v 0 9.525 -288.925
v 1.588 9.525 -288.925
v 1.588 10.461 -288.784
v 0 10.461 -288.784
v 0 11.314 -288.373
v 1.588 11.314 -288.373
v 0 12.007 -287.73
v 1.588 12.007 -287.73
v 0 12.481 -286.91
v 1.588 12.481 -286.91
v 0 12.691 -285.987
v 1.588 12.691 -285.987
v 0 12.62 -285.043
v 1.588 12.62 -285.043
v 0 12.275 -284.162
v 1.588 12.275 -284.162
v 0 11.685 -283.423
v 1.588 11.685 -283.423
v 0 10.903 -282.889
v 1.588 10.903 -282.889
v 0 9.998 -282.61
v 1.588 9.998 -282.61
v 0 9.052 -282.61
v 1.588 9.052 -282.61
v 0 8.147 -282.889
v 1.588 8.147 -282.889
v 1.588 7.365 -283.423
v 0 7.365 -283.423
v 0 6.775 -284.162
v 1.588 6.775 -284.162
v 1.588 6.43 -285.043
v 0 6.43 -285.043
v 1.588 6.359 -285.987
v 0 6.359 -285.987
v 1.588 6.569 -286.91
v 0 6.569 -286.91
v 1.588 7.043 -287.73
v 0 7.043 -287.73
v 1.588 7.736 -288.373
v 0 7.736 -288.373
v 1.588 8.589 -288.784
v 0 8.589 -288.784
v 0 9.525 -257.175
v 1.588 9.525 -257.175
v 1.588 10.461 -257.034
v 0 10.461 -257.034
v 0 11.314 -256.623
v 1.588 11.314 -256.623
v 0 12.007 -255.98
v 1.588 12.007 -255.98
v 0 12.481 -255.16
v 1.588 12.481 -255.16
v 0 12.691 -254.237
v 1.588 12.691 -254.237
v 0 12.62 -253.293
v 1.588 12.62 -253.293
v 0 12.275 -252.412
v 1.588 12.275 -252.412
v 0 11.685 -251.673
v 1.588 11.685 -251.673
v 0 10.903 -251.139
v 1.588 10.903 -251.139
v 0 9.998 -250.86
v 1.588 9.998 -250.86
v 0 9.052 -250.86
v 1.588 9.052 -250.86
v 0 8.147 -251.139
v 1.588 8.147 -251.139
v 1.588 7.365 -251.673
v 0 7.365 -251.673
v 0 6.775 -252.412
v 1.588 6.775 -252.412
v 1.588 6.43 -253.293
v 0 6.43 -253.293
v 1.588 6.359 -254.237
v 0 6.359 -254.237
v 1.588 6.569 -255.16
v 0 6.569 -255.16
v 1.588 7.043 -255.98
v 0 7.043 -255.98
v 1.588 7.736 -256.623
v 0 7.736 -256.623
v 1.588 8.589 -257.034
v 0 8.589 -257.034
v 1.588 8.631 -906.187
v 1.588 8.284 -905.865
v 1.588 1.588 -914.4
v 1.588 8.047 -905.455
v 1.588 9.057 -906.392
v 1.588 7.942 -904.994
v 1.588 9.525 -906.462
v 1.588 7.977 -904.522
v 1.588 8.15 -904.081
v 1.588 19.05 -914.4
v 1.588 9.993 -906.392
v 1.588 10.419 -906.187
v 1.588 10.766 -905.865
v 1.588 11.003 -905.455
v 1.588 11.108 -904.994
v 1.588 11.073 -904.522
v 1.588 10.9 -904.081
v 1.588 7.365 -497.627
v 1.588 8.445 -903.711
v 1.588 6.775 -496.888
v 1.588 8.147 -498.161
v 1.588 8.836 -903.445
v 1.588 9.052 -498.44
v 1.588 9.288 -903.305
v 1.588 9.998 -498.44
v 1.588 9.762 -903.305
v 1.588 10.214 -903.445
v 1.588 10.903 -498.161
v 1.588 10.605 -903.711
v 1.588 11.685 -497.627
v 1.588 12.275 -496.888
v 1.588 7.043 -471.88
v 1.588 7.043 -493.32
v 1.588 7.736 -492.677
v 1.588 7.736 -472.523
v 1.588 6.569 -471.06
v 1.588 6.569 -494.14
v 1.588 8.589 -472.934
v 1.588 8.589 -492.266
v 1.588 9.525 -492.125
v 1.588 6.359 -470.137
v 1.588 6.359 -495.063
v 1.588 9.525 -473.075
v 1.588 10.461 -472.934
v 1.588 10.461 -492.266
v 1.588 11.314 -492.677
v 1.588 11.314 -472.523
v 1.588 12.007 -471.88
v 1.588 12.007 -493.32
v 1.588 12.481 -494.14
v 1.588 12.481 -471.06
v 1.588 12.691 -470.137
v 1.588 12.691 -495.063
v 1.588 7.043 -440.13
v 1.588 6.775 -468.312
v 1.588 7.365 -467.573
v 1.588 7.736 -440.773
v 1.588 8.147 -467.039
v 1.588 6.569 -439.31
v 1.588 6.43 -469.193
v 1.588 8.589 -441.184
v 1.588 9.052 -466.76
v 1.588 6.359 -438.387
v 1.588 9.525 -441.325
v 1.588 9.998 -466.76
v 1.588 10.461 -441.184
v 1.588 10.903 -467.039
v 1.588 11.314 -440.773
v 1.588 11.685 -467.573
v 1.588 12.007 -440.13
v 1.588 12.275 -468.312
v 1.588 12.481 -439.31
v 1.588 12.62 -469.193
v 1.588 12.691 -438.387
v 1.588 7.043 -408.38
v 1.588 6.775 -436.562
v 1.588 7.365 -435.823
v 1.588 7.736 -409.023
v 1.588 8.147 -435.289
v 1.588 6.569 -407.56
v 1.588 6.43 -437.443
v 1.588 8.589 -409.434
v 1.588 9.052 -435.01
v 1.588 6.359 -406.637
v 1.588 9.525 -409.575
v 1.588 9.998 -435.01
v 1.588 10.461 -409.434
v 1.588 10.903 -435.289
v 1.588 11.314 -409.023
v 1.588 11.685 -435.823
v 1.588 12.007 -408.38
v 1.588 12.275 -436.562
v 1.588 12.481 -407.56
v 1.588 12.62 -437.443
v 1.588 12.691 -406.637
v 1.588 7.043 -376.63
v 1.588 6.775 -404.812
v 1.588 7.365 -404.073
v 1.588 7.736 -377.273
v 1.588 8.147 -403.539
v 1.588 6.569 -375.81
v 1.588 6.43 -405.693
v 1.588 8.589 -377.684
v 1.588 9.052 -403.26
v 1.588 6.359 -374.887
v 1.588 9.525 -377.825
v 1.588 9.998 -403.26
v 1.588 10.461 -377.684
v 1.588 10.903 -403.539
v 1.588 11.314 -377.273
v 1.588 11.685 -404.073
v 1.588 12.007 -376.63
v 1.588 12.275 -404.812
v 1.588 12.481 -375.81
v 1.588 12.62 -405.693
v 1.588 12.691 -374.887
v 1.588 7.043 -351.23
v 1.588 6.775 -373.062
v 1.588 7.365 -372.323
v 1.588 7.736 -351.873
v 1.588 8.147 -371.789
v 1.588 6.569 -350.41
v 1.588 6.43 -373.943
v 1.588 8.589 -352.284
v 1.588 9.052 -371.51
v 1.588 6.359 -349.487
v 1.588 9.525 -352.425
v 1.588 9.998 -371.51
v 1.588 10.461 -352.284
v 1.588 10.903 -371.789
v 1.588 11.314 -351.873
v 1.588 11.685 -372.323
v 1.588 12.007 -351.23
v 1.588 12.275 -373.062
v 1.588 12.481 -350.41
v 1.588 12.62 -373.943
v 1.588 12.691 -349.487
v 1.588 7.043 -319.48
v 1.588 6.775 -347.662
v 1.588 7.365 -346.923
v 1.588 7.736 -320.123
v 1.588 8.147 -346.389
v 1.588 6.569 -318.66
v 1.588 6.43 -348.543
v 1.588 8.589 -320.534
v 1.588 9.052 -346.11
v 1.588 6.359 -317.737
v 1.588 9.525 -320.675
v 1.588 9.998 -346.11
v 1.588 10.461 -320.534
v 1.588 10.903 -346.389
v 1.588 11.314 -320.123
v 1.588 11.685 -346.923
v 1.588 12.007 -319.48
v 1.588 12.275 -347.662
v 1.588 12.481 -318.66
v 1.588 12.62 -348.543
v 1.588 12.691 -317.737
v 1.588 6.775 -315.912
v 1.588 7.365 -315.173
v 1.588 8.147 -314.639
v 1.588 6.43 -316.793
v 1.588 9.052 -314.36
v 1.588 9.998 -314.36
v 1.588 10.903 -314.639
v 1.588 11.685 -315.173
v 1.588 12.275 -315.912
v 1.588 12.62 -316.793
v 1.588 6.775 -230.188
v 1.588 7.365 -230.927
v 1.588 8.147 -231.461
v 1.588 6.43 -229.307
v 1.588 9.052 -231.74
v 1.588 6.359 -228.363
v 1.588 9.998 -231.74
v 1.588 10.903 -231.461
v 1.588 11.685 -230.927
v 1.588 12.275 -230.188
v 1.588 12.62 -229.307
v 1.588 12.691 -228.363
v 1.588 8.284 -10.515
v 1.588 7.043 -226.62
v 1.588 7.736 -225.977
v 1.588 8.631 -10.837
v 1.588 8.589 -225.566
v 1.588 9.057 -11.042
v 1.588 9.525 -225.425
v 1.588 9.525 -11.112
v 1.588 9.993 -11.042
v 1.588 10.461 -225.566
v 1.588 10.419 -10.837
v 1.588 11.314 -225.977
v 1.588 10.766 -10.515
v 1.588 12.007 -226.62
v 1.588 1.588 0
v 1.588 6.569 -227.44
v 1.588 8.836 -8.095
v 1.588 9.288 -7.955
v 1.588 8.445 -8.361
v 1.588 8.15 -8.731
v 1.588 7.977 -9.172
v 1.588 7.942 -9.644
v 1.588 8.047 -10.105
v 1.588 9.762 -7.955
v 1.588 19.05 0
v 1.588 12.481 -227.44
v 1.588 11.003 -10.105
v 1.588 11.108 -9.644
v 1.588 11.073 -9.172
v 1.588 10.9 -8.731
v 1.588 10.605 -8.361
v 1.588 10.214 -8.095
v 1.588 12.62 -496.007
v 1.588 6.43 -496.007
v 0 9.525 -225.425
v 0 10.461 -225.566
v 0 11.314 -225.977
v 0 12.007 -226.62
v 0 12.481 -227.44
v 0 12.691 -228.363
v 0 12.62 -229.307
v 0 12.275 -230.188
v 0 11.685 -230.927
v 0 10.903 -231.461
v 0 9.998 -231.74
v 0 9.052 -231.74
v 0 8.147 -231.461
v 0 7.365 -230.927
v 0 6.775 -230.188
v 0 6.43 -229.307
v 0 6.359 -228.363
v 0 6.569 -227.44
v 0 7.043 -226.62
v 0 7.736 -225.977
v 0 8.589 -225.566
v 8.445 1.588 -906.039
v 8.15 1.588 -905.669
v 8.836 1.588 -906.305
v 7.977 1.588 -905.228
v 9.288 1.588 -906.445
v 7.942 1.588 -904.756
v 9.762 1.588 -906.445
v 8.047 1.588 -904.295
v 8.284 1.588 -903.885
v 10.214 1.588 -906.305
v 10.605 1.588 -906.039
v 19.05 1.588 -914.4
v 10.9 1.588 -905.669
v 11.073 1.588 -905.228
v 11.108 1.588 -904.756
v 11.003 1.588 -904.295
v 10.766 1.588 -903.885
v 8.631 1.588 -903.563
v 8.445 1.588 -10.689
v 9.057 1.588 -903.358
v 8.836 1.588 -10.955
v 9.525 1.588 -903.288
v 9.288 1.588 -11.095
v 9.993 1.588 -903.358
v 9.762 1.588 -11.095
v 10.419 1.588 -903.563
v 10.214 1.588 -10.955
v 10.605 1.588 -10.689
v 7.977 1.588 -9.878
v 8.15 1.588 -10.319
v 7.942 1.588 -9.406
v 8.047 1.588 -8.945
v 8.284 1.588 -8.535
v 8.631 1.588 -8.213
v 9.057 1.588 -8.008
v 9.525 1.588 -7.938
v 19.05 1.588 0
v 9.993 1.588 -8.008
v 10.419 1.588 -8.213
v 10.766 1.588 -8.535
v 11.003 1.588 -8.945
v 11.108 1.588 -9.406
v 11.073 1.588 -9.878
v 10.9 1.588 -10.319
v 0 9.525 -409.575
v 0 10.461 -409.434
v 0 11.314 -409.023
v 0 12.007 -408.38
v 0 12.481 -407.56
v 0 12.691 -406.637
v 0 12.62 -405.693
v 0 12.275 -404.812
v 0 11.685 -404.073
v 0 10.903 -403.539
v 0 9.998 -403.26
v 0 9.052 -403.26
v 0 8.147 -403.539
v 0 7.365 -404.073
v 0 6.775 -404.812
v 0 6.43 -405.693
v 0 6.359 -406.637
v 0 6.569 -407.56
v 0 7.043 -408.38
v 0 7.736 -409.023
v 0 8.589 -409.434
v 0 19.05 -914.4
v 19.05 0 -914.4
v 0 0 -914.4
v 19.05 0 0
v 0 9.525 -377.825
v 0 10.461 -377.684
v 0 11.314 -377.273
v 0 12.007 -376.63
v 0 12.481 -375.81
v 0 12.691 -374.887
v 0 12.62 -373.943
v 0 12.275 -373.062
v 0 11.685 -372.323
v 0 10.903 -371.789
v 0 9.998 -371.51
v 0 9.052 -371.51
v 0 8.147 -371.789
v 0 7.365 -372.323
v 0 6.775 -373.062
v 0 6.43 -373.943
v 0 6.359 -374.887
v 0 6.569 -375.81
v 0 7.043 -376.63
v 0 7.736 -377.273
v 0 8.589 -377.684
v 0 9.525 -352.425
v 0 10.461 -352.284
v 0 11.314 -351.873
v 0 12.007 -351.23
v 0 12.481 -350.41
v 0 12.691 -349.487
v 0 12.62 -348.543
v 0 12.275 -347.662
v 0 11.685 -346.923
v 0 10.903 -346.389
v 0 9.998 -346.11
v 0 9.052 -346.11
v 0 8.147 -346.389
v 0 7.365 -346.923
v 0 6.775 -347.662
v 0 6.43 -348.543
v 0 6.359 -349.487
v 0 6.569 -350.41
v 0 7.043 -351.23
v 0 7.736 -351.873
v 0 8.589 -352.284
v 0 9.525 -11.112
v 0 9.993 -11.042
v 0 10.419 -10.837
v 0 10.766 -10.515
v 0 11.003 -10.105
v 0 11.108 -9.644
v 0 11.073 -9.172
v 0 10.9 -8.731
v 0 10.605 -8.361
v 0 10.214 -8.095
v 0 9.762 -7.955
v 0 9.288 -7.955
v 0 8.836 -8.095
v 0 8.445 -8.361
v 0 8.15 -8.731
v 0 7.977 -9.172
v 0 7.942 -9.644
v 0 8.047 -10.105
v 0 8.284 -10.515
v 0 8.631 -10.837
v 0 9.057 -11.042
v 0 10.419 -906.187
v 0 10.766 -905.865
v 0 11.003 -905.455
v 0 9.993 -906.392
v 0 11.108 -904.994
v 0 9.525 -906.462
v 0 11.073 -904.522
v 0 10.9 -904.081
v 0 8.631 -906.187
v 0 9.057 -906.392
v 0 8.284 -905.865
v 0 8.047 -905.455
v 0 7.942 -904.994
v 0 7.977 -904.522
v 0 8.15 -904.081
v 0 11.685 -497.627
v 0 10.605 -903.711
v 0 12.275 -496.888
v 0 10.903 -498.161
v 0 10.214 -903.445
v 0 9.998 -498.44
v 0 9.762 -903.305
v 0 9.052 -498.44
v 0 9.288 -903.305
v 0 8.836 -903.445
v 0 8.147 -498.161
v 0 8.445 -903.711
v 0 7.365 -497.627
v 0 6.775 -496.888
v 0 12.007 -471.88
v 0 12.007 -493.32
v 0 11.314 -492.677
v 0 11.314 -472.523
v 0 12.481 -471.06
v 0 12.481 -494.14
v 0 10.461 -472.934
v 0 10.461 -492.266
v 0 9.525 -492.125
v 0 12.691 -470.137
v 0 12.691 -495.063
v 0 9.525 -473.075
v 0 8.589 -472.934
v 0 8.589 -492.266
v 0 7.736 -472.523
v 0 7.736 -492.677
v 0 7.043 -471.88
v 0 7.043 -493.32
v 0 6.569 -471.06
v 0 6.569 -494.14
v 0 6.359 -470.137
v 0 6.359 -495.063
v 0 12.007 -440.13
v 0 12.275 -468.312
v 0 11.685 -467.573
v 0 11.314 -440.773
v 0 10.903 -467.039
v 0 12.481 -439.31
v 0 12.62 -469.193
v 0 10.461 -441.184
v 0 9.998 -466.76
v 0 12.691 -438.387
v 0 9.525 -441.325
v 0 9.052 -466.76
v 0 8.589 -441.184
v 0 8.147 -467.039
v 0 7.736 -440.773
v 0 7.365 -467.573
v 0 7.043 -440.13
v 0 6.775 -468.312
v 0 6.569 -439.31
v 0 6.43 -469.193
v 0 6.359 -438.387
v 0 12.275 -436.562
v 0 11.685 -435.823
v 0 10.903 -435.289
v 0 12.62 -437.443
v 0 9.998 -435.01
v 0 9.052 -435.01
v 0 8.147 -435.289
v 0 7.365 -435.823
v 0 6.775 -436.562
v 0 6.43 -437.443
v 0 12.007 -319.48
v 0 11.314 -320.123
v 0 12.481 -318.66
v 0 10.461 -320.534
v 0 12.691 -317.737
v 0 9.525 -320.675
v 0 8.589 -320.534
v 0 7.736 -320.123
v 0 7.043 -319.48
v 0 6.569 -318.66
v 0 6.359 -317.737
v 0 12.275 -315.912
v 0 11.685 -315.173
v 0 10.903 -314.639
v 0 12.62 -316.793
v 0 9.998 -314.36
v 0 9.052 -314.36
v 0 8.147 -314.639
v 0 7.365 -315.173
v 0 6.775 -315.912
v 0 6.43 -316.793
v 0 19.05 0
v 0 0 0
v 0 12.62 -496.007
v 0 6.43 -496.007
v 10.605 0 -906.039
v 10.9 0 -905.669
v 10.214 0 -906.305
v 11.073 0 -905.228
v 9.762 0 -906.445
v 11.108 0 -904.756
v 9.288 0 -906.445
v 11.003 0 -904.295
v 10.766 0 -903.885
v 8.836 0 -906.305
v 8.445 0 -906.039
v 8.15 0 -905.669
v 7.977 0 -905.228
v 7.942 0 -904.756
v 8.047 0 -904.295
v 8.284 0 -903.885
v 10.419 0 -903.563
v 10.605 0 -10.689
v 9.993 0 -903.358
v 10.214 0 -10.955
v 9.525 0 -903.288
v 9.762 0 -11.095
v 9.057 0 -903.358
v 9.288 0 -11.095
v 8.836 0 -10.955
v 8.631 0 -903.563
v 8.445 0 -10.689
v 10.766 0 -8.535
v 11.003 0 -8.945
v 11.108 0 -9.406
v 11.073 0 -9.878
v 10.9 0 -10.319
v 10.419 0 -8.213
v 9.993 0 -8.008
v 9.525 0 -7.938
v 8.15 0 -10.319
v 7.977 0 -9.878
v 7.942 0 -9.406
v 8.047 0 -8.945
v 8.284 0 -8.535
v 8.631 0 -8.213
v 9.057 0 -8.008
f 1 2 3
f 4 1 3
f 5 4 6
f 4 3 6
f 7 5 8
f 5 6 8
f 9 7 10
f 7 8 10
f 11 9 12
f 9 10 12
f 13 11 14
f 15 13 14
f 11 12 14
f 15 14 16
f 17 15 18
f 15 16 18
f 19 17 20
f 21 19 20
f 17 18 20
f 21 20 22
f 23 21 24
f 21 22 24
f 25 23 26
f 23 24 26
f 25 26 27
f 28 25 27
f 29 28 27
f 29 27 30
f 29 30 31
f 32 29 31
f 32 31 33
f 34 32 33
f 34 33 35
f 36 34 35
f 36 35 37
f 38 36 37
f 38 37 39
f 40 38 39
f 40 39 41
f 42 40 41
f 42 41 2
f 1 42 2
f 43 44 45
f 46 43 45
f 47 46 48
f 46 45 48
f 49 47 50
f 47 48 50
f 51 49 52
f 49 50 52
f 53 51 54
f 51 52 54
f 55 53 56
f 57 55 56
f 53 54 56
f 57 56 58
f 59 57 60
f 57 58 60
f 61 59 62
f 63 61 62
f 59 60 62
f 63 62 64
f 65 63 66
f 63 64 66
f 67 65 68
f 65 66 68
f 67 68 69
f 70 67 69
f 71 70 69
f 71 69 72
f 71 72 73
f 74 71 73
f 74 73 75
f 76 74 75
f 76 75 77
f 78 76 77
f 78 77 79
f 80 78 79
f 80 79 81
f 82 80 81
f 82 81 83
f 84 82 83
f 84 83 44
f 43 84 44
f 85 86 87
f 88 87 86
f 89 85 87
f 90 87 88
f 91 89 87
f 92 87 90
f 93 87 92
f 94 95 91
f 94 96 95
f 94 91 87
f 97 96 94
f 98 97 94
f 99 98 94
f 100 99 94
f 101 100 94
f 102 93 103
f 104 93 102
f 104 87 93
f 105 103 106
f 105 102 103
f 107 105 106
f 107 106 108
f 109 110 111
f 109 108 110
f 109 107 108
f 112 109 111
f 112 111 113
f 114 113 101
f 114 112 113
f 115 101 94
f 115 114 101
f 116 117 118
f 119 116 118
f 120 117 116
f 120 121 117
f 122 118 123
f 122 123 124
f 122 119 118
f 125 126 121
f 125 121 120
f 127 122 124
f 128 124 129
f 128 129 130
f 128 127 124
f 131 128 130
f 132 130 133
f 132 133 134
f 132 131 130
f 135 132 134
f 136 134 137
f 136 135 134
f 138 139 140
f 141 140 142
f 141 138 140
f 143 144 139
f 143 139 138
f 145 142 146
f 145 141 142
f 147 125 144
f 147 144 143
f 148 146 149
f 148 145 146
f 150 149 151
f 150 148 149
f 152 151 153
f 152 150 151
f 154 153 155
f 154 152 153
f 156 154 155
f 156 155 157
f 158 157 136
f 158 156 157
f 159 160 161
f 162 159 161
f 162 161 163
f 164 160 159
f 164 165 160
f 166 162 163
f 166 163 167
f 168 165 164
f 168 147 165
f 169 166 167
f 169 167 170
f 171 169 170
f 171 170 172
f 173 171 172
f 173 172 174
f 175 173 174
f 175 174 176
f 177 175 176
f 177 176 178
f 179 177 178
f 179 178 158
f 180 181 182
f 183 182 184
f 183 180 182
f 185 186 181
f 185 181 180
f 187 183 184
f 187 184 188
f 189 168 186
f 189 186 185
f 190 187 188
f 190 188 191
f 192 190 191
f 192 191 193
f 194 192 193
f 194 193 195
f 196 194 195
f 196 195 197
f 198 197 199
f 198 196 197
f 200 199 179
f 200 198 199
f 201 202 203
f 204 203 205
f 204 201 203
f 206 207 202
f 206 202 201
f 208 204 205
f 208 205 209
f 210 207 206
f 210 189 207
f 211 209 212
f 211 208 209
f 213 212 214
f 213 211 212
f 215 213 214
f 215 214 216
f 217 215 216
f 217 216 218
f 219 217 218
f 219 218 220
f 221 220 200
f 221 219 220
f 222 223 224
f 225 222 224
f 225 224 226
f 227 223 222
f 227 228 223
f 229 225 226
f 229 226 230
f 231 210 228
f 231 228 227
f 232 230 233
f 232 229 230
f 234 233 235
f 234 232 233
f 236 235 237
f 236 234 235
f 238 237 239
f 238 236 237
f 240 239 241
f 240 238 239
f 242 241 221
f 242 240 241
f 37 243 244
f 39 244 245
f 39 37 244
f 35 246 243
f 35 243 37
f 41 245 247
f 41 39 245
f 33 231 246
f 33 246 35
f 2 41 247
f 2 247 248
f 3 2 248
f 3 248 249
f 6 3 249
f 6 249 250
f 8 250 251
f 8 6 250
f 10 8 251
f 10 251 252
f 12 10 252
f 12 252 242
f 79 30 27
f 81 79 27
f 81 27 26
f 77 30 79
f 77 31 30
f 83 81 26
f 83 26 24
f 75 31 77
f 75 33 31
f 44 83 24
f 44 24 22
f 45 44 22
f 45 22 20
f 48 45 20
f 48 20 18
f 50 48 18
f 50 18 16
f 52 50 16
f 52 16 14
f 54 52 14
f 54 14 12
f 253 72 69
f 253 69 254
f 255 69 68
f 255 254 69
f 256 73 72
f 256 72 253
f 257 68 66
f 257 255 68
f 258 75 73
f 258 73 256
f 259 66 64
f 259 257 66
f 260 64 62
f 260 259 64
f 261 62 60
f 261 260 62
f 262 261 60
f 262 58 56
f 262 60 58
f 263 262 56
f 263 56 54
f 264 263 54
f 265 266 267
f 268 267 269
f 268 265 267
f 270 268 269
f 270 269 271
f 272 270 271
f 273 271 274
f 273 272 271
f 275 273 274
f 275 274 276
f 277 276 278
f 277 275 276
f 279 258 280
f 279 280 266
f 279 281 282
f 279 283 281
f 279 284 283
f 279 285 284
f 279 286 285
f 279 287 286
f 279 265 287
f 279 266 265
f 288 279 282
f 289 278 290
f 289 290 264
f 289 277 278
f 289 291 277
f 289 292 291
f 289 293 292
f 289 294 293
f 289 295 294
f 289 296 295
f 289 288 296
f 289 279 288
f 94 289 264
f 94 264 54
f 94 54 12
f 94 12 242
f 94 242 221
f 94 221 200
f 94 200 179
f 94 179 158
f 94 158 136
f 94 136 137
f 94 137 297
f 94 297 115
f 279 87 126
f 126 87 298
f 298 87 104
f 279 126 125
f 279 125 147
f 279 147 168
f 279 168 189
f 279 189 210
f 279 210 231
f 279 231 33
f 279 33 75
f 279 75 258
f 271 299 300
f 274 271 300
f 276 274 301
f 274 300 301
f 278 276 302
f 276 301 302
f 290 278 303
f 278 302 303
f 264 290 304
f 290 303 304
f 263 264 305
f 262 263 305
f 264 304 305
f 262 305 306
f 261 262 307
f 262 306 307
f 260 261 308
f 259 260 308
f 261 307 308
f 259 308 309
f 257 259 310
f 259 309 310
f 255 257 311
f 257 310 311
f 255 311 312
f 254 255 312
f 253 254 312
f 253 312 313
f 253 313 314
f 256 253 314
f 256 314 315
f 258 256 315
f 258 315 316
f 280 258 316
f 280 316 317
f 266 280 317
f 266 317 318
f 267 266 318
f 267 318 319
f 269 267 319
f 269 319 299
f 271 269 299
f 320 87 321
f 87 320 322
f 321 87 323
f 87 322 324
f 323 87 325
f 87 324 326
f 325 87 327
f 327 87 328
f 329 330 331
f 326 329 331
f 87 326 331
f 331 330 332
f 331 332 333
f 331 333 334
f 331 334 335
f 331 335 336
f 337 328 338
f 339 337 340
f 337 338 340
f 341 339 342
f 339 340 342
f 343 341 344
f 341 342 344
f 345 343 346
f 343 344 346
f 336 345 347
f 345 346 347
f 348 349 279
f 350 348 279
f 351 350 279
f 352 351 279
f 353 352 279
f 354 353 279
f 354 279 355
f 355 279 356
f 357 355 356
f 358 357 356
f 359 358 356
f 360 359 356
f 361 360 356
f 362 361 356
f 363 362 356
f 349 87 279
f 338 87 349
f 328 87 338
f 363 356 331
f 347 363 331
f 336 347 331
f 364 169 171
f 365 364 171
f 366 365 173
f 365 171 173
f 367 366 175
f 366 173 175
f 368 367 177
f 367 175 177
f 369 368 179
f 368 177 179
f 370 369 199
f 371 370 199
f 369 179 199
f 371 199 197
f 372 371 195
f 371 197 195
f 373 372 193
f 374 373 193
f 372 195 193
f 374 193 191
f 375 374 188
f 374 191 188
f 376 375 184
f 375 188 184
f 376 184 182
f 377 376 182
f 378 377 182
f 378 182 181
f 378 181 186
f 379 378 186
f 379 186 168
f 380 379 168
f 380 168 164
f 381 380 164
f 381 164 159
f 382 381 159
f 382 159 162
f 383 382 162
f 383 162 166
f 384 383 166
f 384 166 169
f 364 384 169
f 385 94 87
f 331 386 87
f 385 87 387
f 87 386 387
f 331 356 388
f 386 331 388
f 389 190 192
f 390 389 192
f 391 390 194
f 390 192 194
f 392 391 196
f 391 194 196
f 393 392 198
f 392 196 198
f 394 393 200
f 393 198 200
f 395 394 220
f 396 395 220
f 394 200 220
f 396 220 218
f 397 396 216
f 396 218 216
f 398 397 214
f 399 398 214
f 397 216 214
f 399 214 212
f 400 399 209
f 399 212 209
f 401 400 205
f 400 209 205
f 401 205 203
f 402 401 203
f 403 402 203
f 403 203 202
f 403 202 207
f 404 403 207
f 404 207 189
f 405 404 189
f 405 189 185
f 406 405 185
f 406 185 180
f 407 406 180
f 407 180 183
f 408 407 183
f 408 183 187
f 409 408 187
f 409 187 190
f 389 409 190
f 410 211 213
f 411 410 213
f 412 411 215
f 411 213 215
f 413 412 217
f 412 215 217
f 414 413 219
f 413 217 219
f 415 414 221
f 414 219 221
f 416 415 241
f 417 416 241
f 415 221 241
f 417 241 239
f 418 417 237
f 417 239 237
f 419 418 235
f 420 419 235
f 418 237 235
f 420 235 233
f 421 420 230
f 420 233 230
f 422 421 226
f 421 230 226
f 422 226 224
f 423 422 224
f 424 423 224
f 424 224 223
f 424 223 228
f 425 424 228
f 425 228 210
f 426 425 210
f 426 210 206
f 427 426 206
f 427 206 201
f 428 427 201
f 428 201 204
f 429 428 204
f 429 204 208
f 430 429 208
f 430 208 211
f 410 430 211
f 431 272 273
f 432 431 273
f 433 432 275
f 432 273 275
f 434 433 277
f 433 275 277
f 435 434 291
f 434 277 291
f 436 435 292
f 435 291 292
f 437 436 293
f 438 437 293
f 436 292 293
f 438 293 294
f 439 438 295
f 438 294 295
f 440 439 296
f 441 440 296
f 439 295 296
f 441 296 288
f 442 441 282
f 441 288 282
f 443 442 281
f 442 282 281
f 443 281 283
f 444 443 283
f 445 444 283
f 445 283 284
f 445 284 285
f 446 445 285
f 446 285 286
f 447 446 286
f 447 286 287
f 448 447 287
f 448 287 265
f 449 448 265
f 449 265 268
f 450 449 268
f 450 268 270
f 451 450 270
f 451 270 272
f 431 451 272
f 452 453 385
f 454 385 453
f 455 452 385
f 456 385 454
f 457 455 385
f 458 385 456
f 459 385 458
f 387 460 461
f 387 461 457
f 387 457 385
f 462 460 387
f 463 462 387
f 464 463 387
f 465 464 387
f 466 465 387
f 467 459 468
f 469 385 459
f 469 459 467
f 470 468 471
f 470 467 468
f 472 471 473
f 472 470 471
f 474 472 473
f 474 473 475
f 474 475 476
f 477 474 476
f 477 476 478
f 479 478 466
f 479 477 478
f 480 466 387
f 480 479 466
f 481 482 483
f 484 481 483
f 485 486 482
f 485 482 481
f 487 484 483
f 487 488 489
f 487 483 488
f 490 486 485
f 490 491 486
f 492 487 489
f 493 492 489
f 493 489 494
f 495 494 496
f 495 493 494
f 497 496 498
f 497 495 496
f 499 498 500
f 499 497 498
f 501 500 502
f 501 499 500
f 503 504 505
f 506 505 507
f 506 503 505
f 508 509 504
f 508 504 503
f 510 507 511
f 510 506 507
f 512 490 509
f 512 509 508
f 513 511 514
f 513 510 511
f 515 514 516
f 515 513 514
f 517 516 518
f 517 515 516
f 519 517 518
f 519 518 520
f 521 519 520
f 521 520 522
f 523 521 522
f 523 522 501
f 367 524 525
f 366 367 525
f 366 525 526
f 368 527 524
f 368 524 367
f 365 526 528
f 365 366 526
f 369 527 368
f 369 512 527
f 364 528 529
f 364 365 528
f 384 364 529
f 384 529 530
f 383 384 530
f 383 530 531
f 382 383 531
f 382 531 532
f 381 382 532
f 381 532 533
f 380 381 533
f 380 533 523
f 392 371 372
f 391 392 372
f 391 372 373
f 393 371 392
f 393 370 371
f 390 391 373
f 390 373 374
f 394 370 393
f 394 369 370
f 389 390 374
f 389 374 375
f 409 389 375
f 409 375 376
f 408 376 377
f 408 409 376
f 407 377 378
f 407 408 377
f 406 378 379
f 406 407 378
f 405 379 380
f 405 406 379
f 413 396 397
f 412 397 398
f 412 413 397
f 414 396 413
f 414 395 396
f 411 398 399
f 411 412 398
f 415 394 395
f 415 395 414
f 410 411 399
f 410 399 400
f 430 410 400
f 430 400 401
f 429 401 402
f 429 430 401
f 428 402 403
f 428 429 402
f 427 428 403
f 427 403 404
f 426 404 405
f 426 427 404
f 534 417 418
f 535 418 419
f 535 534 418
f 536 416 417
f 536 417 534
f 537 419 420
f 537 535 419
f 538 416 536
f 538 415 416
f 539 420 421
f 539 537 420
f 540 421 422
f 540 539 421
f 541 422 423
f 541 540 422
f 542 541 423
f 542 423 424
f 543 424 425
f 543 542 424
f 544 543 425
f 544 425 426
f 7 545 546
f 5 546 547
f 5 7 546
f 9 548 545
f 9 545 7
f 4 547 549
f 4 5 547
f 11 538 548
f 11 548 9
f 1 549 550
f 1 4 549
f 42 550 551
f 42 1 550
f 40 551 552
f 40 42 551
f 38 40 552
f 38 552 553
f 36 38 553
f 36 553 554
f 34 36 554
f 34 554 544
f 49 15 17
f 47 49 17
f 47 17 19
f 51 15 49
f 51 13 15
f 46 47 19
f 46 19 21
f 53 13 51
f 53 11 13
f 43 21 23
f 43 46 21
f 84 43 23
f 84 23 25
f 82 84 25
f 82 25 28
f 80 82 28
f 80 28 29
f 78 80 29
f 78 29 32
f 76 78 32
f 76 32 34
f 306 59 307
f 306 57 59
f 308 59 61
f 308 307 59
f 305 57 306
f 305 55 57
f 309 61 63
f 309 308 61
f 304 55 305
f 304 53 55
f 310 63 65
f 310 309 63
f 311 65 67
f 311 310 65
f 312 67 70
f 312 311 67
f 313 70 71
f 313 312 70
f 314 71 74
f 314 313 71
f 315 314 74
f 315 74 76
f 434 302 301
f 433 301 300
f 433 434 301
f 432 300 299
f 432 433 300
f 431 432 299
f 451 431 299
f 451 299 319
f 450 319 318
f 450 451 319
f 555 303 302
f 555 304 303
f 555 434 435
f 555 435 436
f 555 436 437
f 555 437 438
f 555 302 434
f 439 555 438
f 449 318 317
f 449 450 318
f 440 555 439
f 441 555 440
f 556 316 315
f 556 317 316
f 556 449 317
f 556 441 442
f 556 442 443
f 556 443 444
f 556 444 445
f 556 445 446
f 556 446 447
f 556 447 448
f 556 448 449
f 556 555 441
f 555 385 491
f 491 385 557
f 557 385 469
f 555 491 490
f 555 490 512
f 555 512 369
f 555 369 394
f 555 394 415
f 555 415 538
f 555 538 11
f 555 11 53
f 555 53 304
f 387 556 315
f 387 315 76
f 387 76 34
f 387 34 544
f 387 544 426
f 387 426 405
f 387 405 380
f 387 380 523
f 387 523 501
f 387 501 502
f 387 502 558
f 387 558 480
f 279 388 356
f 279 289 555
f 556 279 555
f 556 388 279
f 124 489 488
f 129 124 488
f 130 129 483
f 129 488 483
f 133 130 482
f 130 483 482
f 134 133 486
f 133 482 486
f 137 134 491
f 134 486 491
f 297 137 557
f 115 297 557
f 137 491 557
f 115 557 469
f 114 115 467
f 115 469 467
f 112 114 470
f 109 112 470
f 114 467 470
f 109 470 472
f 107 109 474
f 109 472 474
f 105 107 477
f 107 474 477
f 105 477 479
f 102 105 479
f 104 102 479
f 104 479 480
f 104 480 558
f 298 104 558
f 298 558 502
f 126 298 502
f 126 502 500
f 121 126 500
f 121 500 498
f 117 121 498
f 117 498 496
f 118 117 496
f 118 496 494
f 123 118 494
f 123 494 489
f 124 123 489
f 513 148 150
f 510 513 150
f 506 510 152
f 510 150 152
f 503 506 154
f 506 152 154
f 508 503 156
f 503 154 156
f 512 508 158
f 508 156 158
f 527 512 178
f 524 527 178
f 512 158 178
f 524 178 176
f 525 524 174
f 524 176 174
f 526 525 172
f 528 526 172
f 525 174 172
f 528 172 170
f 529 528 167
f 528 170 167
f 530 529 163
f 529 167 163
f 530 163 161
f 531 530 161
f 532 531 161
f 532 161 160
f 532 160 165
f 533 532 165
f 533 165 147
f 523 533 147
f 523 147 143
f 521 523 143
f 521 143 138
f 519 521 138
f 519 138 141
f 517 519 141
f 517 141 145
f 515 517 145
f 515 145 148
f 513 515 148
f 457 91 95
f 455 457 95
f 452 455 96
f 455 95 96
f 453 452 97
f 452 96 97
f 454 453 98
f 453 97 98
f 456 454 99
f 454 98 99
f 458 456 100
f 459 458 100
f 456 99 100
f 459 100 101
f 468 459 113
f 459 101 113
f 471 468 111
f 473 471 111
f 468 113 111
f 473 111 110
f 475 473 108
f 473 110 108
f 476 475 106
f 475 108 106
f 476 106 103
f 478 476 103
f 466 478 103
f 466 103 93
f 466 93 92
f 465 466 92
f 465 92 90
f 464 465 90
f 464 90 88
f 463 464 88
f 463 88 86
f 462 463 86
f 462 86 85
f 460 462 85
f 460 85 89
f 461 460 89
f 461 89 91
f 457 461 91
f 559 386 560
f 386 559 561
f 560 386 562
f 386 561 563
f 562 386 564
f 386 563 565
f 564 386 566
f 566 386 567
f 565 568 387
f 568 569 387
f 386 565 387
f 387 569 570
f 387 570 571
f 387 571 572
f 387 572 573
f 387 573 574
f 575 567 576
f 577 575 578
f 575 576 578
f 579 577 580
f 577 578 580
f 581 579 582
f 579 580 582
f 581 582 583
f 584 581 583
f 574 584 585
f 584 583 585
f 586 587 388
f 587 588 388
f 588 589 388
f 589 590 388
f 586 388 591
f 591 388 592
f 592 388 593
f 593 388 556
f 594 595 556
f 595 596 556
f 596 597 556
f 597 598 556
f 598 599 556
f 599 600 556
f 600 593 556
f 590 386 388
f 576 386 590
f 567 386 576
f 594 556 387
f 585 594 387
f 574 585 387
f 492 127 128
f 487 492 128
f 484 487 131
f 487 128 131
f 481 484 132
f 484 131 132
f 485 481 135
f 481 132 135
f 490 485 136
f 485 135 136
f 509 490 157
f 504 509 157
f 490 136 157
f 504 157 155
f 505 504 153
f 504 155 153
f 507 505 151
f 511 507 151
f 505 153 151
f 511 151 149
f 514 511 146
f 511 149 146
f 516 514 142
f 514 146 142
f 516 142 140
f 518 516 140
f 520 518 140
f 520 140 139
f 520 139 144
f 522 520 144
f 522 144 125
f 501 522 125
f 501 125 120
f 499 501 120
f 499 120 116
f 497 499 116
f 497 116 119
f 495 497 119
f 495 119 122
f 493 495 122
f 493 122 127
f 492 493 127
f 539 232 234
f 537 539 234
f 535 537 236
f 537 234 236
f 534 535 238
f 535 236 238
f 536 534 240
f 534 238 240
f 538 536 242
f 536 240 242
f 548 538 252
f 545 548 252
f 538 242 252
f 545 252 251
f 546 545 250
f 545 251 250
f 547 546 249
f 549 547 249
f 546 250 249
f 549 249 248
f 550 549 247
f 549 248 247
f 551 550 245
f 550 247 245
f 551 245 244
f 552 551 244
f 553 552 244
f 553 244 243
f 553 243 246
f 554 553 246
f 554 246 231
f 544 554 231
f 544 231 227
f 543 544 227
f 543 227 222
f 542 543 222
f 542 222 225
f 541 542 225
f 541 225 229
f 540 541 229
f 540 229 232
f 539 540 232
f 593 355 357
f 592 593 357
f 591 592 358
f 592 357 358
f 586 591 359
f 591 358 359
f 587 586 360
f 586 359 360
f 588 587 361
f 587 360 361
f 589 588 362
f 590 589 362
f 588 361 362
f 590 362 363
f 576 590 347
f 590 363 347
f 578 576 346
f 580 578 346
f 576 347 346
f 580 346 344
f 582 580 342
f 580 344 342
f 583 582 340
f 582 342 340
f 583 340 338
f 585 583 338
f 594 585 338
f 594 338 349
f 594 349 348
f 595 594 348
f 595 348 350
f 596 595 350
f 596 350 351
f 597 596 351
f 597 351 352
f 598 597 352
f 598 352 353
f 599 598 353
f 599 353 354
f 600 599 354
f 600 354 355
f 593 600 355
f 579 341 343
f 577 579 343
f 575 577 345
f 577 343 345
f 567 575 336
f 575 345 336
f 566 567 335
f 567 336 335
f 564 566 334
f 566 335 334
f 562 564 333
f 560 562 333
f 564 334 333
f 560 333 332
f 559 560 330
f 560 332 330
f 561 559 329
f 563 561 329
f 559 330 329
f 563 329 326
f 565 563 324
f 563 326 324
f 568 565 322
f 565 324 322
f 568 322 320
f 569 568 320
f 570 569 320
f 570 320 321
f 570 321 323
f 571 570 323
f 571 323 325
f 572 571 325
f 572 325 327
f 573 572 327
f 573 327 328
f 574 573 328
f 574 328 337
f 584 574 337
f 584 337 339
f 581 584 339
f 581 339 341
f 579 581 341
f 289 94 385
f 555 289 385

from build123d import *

# Parameters (mm, degrees)
BOSS_EXTRUDE1_DEPTH = 914.4
SKETCH2_R           = 1.5875
CUT_EXTRUDE2_DEPTH  = 2.794
SKETCH4_R           = 1.5875
SKETCH4_R_2         = 3.175
CUT_EXTRUDE3_DEPTH  = 8.89
SKETCH10_W          = 19.05
SKETCH10_H          = 914.4
CUT_EXTRUDE4_DEPTH  = 915.79678891
CUT_EXTRUDE5_REACH  = 916.797
SKETCH11_R          = 3.175


with BuildPart() as part:
    # Sketch1 → Boss-Extrude1 (new body)
    with BuildSketch(Plane.XY):
        Polygon((0, 0), (0, 19.05), (1.5875, 19.05), (1.5875, 1.5875), (19.05, 1.5875), (19.05, 0), align=None)
    boss_extrude1 = extrude(amount=-BOSS_EXTRUDE1_DEPTH)

    # Sketch2 → Cut-Extrude2 (cut)
    with BuildSketch(Plane(origin=(0, 1.5875, 0), x_dir=(1, 0, 0), z_dir=(0, 1, 0))):
        with Locations((9.525, 9.525)):
            Circle(SKETCH2_R)
        with Locations((9.525, 904.875)):
            Circle(SKETCH2_R)
    cut_extrude2 = extrude(amount=-CUT_EXTRUDE2_DEPTH, mode=Mode.SUBTRACT)

    # Sketch4 → Cut-Extrude3 (cut)
    with BuildSketch(Plane(origin=(1.5875, 0, 0), x_dir=(0, 0, -1), z_dir=(1, 0, 0))):
        with Locations((9.525, 9.525)):
            Circle(SKETCH4_R)
        with Locations((904.875, 9.525)):
            Circle(SKETCH4_R)
        with Locations((254, 9.525)):
            Circle(SKETCH4_R_2)
        with Locations((285.75, 9.525)):
            Circle(SKETCH4_R_2)
        with Locations((317.5, 9.525)):
            Circle(SKETCH4_R_2)
        with Locations((349.25, 9.525)):
            Circle(SKETCH4_R_2)
        with Locations((469.9, 9.525)):
            Circle(SKETCH4_R_2)
        with Locations((406.4, 9.525)):
            Circle(SKETCH4_R_2)
        with Locations((438.15, 9.525)):
            Circle(SKETCH4_R_2)
        with Locations((374.65, 9.525)):
            Circle(SKETCH4_R_2)
    cut_extrude3 = extrude(amount=-CUT_EXTRUDE3_DEPTH, mode=Mode.SUBTRACT)

    # Mirror1: Boss-Extrude1, Cut-Extrude2, Cut-Extrude3 across plane
    add(boss_extrude1.mirror(Plane(origin=(0, 19.05, -914.4), x_dir=(0, 0, 1), z_dir=(0, 1, 0))))
    add(cut_extrude2.mirror(Plane(origin=(0, 19.05, -914.4), x_dir=(0, 0, 1), z_dir=(0, 1, 0))), mode=Mode.SUBTRACT)
    add(cut_extrude3.mirror(Plane(origin=(0, 19.05, -914.4), x_dir=(0, 0, 1), z_dir=(0, 1, 0))), mode=Mode.SUBTRACT)

    # Sketch10 → Cut-Extrude4 (cut, through all)
    with BuildSketch(Plane(origin=(0, 19.05, 0), x_dir=(-1, 0, 0), z_dir=(0, -1, 0))):
        with Locations((-9.525, 457.2)):
            Rectangle(SKETCH10_W, SKETCH10_H)
    extrude(amount=-CUT_EXTRUDE4_DEPTH, mode=Mode.SUBTRACT)

    # Sketch11 → Cut-Extrude5 (cut, up to next)
    with BuildSketch(Plane.ZY, mode=Mode.PRIVATE) as cut_extrude5_sk1:
        with Locations((-228.6, 9.525)):
            Circle(SKETCH11_R)
    cut_extrude5_tool1 = extrude(cut_extrude5_sk1.sketch, amount=-CUT_EXTRUDE5_REACH, mode=Mode.PRIVATE) & part.part
    # Sketch11 → Cut-Extrude5 (cut, up to next)
    with BuildSketch(Plane.ZY, mode=Mode.PRIVATE) as cut_extrude5_sk2:
        with Locations((-495.3, 9.525)):
            Circle(SKETCH11_R)
    cut_extrude5_tool2 = extrude(cut_extrude5_sk2.sketch, amount=-CUT_EXTRUDE5_REACH, mode=Mode.PRIVATE) & part.part
    add(cut_extrude5_tool1.solids().sort_by_distance((0, 9.525, -228.6))[0], mode=Mode.SUBTRACT)
    add(cut_extrude5_tool2.solids().sort_by_distance((0, 9.525, -495.3))[0], mode=Mode.SUBTRACT)


solid = part.part
